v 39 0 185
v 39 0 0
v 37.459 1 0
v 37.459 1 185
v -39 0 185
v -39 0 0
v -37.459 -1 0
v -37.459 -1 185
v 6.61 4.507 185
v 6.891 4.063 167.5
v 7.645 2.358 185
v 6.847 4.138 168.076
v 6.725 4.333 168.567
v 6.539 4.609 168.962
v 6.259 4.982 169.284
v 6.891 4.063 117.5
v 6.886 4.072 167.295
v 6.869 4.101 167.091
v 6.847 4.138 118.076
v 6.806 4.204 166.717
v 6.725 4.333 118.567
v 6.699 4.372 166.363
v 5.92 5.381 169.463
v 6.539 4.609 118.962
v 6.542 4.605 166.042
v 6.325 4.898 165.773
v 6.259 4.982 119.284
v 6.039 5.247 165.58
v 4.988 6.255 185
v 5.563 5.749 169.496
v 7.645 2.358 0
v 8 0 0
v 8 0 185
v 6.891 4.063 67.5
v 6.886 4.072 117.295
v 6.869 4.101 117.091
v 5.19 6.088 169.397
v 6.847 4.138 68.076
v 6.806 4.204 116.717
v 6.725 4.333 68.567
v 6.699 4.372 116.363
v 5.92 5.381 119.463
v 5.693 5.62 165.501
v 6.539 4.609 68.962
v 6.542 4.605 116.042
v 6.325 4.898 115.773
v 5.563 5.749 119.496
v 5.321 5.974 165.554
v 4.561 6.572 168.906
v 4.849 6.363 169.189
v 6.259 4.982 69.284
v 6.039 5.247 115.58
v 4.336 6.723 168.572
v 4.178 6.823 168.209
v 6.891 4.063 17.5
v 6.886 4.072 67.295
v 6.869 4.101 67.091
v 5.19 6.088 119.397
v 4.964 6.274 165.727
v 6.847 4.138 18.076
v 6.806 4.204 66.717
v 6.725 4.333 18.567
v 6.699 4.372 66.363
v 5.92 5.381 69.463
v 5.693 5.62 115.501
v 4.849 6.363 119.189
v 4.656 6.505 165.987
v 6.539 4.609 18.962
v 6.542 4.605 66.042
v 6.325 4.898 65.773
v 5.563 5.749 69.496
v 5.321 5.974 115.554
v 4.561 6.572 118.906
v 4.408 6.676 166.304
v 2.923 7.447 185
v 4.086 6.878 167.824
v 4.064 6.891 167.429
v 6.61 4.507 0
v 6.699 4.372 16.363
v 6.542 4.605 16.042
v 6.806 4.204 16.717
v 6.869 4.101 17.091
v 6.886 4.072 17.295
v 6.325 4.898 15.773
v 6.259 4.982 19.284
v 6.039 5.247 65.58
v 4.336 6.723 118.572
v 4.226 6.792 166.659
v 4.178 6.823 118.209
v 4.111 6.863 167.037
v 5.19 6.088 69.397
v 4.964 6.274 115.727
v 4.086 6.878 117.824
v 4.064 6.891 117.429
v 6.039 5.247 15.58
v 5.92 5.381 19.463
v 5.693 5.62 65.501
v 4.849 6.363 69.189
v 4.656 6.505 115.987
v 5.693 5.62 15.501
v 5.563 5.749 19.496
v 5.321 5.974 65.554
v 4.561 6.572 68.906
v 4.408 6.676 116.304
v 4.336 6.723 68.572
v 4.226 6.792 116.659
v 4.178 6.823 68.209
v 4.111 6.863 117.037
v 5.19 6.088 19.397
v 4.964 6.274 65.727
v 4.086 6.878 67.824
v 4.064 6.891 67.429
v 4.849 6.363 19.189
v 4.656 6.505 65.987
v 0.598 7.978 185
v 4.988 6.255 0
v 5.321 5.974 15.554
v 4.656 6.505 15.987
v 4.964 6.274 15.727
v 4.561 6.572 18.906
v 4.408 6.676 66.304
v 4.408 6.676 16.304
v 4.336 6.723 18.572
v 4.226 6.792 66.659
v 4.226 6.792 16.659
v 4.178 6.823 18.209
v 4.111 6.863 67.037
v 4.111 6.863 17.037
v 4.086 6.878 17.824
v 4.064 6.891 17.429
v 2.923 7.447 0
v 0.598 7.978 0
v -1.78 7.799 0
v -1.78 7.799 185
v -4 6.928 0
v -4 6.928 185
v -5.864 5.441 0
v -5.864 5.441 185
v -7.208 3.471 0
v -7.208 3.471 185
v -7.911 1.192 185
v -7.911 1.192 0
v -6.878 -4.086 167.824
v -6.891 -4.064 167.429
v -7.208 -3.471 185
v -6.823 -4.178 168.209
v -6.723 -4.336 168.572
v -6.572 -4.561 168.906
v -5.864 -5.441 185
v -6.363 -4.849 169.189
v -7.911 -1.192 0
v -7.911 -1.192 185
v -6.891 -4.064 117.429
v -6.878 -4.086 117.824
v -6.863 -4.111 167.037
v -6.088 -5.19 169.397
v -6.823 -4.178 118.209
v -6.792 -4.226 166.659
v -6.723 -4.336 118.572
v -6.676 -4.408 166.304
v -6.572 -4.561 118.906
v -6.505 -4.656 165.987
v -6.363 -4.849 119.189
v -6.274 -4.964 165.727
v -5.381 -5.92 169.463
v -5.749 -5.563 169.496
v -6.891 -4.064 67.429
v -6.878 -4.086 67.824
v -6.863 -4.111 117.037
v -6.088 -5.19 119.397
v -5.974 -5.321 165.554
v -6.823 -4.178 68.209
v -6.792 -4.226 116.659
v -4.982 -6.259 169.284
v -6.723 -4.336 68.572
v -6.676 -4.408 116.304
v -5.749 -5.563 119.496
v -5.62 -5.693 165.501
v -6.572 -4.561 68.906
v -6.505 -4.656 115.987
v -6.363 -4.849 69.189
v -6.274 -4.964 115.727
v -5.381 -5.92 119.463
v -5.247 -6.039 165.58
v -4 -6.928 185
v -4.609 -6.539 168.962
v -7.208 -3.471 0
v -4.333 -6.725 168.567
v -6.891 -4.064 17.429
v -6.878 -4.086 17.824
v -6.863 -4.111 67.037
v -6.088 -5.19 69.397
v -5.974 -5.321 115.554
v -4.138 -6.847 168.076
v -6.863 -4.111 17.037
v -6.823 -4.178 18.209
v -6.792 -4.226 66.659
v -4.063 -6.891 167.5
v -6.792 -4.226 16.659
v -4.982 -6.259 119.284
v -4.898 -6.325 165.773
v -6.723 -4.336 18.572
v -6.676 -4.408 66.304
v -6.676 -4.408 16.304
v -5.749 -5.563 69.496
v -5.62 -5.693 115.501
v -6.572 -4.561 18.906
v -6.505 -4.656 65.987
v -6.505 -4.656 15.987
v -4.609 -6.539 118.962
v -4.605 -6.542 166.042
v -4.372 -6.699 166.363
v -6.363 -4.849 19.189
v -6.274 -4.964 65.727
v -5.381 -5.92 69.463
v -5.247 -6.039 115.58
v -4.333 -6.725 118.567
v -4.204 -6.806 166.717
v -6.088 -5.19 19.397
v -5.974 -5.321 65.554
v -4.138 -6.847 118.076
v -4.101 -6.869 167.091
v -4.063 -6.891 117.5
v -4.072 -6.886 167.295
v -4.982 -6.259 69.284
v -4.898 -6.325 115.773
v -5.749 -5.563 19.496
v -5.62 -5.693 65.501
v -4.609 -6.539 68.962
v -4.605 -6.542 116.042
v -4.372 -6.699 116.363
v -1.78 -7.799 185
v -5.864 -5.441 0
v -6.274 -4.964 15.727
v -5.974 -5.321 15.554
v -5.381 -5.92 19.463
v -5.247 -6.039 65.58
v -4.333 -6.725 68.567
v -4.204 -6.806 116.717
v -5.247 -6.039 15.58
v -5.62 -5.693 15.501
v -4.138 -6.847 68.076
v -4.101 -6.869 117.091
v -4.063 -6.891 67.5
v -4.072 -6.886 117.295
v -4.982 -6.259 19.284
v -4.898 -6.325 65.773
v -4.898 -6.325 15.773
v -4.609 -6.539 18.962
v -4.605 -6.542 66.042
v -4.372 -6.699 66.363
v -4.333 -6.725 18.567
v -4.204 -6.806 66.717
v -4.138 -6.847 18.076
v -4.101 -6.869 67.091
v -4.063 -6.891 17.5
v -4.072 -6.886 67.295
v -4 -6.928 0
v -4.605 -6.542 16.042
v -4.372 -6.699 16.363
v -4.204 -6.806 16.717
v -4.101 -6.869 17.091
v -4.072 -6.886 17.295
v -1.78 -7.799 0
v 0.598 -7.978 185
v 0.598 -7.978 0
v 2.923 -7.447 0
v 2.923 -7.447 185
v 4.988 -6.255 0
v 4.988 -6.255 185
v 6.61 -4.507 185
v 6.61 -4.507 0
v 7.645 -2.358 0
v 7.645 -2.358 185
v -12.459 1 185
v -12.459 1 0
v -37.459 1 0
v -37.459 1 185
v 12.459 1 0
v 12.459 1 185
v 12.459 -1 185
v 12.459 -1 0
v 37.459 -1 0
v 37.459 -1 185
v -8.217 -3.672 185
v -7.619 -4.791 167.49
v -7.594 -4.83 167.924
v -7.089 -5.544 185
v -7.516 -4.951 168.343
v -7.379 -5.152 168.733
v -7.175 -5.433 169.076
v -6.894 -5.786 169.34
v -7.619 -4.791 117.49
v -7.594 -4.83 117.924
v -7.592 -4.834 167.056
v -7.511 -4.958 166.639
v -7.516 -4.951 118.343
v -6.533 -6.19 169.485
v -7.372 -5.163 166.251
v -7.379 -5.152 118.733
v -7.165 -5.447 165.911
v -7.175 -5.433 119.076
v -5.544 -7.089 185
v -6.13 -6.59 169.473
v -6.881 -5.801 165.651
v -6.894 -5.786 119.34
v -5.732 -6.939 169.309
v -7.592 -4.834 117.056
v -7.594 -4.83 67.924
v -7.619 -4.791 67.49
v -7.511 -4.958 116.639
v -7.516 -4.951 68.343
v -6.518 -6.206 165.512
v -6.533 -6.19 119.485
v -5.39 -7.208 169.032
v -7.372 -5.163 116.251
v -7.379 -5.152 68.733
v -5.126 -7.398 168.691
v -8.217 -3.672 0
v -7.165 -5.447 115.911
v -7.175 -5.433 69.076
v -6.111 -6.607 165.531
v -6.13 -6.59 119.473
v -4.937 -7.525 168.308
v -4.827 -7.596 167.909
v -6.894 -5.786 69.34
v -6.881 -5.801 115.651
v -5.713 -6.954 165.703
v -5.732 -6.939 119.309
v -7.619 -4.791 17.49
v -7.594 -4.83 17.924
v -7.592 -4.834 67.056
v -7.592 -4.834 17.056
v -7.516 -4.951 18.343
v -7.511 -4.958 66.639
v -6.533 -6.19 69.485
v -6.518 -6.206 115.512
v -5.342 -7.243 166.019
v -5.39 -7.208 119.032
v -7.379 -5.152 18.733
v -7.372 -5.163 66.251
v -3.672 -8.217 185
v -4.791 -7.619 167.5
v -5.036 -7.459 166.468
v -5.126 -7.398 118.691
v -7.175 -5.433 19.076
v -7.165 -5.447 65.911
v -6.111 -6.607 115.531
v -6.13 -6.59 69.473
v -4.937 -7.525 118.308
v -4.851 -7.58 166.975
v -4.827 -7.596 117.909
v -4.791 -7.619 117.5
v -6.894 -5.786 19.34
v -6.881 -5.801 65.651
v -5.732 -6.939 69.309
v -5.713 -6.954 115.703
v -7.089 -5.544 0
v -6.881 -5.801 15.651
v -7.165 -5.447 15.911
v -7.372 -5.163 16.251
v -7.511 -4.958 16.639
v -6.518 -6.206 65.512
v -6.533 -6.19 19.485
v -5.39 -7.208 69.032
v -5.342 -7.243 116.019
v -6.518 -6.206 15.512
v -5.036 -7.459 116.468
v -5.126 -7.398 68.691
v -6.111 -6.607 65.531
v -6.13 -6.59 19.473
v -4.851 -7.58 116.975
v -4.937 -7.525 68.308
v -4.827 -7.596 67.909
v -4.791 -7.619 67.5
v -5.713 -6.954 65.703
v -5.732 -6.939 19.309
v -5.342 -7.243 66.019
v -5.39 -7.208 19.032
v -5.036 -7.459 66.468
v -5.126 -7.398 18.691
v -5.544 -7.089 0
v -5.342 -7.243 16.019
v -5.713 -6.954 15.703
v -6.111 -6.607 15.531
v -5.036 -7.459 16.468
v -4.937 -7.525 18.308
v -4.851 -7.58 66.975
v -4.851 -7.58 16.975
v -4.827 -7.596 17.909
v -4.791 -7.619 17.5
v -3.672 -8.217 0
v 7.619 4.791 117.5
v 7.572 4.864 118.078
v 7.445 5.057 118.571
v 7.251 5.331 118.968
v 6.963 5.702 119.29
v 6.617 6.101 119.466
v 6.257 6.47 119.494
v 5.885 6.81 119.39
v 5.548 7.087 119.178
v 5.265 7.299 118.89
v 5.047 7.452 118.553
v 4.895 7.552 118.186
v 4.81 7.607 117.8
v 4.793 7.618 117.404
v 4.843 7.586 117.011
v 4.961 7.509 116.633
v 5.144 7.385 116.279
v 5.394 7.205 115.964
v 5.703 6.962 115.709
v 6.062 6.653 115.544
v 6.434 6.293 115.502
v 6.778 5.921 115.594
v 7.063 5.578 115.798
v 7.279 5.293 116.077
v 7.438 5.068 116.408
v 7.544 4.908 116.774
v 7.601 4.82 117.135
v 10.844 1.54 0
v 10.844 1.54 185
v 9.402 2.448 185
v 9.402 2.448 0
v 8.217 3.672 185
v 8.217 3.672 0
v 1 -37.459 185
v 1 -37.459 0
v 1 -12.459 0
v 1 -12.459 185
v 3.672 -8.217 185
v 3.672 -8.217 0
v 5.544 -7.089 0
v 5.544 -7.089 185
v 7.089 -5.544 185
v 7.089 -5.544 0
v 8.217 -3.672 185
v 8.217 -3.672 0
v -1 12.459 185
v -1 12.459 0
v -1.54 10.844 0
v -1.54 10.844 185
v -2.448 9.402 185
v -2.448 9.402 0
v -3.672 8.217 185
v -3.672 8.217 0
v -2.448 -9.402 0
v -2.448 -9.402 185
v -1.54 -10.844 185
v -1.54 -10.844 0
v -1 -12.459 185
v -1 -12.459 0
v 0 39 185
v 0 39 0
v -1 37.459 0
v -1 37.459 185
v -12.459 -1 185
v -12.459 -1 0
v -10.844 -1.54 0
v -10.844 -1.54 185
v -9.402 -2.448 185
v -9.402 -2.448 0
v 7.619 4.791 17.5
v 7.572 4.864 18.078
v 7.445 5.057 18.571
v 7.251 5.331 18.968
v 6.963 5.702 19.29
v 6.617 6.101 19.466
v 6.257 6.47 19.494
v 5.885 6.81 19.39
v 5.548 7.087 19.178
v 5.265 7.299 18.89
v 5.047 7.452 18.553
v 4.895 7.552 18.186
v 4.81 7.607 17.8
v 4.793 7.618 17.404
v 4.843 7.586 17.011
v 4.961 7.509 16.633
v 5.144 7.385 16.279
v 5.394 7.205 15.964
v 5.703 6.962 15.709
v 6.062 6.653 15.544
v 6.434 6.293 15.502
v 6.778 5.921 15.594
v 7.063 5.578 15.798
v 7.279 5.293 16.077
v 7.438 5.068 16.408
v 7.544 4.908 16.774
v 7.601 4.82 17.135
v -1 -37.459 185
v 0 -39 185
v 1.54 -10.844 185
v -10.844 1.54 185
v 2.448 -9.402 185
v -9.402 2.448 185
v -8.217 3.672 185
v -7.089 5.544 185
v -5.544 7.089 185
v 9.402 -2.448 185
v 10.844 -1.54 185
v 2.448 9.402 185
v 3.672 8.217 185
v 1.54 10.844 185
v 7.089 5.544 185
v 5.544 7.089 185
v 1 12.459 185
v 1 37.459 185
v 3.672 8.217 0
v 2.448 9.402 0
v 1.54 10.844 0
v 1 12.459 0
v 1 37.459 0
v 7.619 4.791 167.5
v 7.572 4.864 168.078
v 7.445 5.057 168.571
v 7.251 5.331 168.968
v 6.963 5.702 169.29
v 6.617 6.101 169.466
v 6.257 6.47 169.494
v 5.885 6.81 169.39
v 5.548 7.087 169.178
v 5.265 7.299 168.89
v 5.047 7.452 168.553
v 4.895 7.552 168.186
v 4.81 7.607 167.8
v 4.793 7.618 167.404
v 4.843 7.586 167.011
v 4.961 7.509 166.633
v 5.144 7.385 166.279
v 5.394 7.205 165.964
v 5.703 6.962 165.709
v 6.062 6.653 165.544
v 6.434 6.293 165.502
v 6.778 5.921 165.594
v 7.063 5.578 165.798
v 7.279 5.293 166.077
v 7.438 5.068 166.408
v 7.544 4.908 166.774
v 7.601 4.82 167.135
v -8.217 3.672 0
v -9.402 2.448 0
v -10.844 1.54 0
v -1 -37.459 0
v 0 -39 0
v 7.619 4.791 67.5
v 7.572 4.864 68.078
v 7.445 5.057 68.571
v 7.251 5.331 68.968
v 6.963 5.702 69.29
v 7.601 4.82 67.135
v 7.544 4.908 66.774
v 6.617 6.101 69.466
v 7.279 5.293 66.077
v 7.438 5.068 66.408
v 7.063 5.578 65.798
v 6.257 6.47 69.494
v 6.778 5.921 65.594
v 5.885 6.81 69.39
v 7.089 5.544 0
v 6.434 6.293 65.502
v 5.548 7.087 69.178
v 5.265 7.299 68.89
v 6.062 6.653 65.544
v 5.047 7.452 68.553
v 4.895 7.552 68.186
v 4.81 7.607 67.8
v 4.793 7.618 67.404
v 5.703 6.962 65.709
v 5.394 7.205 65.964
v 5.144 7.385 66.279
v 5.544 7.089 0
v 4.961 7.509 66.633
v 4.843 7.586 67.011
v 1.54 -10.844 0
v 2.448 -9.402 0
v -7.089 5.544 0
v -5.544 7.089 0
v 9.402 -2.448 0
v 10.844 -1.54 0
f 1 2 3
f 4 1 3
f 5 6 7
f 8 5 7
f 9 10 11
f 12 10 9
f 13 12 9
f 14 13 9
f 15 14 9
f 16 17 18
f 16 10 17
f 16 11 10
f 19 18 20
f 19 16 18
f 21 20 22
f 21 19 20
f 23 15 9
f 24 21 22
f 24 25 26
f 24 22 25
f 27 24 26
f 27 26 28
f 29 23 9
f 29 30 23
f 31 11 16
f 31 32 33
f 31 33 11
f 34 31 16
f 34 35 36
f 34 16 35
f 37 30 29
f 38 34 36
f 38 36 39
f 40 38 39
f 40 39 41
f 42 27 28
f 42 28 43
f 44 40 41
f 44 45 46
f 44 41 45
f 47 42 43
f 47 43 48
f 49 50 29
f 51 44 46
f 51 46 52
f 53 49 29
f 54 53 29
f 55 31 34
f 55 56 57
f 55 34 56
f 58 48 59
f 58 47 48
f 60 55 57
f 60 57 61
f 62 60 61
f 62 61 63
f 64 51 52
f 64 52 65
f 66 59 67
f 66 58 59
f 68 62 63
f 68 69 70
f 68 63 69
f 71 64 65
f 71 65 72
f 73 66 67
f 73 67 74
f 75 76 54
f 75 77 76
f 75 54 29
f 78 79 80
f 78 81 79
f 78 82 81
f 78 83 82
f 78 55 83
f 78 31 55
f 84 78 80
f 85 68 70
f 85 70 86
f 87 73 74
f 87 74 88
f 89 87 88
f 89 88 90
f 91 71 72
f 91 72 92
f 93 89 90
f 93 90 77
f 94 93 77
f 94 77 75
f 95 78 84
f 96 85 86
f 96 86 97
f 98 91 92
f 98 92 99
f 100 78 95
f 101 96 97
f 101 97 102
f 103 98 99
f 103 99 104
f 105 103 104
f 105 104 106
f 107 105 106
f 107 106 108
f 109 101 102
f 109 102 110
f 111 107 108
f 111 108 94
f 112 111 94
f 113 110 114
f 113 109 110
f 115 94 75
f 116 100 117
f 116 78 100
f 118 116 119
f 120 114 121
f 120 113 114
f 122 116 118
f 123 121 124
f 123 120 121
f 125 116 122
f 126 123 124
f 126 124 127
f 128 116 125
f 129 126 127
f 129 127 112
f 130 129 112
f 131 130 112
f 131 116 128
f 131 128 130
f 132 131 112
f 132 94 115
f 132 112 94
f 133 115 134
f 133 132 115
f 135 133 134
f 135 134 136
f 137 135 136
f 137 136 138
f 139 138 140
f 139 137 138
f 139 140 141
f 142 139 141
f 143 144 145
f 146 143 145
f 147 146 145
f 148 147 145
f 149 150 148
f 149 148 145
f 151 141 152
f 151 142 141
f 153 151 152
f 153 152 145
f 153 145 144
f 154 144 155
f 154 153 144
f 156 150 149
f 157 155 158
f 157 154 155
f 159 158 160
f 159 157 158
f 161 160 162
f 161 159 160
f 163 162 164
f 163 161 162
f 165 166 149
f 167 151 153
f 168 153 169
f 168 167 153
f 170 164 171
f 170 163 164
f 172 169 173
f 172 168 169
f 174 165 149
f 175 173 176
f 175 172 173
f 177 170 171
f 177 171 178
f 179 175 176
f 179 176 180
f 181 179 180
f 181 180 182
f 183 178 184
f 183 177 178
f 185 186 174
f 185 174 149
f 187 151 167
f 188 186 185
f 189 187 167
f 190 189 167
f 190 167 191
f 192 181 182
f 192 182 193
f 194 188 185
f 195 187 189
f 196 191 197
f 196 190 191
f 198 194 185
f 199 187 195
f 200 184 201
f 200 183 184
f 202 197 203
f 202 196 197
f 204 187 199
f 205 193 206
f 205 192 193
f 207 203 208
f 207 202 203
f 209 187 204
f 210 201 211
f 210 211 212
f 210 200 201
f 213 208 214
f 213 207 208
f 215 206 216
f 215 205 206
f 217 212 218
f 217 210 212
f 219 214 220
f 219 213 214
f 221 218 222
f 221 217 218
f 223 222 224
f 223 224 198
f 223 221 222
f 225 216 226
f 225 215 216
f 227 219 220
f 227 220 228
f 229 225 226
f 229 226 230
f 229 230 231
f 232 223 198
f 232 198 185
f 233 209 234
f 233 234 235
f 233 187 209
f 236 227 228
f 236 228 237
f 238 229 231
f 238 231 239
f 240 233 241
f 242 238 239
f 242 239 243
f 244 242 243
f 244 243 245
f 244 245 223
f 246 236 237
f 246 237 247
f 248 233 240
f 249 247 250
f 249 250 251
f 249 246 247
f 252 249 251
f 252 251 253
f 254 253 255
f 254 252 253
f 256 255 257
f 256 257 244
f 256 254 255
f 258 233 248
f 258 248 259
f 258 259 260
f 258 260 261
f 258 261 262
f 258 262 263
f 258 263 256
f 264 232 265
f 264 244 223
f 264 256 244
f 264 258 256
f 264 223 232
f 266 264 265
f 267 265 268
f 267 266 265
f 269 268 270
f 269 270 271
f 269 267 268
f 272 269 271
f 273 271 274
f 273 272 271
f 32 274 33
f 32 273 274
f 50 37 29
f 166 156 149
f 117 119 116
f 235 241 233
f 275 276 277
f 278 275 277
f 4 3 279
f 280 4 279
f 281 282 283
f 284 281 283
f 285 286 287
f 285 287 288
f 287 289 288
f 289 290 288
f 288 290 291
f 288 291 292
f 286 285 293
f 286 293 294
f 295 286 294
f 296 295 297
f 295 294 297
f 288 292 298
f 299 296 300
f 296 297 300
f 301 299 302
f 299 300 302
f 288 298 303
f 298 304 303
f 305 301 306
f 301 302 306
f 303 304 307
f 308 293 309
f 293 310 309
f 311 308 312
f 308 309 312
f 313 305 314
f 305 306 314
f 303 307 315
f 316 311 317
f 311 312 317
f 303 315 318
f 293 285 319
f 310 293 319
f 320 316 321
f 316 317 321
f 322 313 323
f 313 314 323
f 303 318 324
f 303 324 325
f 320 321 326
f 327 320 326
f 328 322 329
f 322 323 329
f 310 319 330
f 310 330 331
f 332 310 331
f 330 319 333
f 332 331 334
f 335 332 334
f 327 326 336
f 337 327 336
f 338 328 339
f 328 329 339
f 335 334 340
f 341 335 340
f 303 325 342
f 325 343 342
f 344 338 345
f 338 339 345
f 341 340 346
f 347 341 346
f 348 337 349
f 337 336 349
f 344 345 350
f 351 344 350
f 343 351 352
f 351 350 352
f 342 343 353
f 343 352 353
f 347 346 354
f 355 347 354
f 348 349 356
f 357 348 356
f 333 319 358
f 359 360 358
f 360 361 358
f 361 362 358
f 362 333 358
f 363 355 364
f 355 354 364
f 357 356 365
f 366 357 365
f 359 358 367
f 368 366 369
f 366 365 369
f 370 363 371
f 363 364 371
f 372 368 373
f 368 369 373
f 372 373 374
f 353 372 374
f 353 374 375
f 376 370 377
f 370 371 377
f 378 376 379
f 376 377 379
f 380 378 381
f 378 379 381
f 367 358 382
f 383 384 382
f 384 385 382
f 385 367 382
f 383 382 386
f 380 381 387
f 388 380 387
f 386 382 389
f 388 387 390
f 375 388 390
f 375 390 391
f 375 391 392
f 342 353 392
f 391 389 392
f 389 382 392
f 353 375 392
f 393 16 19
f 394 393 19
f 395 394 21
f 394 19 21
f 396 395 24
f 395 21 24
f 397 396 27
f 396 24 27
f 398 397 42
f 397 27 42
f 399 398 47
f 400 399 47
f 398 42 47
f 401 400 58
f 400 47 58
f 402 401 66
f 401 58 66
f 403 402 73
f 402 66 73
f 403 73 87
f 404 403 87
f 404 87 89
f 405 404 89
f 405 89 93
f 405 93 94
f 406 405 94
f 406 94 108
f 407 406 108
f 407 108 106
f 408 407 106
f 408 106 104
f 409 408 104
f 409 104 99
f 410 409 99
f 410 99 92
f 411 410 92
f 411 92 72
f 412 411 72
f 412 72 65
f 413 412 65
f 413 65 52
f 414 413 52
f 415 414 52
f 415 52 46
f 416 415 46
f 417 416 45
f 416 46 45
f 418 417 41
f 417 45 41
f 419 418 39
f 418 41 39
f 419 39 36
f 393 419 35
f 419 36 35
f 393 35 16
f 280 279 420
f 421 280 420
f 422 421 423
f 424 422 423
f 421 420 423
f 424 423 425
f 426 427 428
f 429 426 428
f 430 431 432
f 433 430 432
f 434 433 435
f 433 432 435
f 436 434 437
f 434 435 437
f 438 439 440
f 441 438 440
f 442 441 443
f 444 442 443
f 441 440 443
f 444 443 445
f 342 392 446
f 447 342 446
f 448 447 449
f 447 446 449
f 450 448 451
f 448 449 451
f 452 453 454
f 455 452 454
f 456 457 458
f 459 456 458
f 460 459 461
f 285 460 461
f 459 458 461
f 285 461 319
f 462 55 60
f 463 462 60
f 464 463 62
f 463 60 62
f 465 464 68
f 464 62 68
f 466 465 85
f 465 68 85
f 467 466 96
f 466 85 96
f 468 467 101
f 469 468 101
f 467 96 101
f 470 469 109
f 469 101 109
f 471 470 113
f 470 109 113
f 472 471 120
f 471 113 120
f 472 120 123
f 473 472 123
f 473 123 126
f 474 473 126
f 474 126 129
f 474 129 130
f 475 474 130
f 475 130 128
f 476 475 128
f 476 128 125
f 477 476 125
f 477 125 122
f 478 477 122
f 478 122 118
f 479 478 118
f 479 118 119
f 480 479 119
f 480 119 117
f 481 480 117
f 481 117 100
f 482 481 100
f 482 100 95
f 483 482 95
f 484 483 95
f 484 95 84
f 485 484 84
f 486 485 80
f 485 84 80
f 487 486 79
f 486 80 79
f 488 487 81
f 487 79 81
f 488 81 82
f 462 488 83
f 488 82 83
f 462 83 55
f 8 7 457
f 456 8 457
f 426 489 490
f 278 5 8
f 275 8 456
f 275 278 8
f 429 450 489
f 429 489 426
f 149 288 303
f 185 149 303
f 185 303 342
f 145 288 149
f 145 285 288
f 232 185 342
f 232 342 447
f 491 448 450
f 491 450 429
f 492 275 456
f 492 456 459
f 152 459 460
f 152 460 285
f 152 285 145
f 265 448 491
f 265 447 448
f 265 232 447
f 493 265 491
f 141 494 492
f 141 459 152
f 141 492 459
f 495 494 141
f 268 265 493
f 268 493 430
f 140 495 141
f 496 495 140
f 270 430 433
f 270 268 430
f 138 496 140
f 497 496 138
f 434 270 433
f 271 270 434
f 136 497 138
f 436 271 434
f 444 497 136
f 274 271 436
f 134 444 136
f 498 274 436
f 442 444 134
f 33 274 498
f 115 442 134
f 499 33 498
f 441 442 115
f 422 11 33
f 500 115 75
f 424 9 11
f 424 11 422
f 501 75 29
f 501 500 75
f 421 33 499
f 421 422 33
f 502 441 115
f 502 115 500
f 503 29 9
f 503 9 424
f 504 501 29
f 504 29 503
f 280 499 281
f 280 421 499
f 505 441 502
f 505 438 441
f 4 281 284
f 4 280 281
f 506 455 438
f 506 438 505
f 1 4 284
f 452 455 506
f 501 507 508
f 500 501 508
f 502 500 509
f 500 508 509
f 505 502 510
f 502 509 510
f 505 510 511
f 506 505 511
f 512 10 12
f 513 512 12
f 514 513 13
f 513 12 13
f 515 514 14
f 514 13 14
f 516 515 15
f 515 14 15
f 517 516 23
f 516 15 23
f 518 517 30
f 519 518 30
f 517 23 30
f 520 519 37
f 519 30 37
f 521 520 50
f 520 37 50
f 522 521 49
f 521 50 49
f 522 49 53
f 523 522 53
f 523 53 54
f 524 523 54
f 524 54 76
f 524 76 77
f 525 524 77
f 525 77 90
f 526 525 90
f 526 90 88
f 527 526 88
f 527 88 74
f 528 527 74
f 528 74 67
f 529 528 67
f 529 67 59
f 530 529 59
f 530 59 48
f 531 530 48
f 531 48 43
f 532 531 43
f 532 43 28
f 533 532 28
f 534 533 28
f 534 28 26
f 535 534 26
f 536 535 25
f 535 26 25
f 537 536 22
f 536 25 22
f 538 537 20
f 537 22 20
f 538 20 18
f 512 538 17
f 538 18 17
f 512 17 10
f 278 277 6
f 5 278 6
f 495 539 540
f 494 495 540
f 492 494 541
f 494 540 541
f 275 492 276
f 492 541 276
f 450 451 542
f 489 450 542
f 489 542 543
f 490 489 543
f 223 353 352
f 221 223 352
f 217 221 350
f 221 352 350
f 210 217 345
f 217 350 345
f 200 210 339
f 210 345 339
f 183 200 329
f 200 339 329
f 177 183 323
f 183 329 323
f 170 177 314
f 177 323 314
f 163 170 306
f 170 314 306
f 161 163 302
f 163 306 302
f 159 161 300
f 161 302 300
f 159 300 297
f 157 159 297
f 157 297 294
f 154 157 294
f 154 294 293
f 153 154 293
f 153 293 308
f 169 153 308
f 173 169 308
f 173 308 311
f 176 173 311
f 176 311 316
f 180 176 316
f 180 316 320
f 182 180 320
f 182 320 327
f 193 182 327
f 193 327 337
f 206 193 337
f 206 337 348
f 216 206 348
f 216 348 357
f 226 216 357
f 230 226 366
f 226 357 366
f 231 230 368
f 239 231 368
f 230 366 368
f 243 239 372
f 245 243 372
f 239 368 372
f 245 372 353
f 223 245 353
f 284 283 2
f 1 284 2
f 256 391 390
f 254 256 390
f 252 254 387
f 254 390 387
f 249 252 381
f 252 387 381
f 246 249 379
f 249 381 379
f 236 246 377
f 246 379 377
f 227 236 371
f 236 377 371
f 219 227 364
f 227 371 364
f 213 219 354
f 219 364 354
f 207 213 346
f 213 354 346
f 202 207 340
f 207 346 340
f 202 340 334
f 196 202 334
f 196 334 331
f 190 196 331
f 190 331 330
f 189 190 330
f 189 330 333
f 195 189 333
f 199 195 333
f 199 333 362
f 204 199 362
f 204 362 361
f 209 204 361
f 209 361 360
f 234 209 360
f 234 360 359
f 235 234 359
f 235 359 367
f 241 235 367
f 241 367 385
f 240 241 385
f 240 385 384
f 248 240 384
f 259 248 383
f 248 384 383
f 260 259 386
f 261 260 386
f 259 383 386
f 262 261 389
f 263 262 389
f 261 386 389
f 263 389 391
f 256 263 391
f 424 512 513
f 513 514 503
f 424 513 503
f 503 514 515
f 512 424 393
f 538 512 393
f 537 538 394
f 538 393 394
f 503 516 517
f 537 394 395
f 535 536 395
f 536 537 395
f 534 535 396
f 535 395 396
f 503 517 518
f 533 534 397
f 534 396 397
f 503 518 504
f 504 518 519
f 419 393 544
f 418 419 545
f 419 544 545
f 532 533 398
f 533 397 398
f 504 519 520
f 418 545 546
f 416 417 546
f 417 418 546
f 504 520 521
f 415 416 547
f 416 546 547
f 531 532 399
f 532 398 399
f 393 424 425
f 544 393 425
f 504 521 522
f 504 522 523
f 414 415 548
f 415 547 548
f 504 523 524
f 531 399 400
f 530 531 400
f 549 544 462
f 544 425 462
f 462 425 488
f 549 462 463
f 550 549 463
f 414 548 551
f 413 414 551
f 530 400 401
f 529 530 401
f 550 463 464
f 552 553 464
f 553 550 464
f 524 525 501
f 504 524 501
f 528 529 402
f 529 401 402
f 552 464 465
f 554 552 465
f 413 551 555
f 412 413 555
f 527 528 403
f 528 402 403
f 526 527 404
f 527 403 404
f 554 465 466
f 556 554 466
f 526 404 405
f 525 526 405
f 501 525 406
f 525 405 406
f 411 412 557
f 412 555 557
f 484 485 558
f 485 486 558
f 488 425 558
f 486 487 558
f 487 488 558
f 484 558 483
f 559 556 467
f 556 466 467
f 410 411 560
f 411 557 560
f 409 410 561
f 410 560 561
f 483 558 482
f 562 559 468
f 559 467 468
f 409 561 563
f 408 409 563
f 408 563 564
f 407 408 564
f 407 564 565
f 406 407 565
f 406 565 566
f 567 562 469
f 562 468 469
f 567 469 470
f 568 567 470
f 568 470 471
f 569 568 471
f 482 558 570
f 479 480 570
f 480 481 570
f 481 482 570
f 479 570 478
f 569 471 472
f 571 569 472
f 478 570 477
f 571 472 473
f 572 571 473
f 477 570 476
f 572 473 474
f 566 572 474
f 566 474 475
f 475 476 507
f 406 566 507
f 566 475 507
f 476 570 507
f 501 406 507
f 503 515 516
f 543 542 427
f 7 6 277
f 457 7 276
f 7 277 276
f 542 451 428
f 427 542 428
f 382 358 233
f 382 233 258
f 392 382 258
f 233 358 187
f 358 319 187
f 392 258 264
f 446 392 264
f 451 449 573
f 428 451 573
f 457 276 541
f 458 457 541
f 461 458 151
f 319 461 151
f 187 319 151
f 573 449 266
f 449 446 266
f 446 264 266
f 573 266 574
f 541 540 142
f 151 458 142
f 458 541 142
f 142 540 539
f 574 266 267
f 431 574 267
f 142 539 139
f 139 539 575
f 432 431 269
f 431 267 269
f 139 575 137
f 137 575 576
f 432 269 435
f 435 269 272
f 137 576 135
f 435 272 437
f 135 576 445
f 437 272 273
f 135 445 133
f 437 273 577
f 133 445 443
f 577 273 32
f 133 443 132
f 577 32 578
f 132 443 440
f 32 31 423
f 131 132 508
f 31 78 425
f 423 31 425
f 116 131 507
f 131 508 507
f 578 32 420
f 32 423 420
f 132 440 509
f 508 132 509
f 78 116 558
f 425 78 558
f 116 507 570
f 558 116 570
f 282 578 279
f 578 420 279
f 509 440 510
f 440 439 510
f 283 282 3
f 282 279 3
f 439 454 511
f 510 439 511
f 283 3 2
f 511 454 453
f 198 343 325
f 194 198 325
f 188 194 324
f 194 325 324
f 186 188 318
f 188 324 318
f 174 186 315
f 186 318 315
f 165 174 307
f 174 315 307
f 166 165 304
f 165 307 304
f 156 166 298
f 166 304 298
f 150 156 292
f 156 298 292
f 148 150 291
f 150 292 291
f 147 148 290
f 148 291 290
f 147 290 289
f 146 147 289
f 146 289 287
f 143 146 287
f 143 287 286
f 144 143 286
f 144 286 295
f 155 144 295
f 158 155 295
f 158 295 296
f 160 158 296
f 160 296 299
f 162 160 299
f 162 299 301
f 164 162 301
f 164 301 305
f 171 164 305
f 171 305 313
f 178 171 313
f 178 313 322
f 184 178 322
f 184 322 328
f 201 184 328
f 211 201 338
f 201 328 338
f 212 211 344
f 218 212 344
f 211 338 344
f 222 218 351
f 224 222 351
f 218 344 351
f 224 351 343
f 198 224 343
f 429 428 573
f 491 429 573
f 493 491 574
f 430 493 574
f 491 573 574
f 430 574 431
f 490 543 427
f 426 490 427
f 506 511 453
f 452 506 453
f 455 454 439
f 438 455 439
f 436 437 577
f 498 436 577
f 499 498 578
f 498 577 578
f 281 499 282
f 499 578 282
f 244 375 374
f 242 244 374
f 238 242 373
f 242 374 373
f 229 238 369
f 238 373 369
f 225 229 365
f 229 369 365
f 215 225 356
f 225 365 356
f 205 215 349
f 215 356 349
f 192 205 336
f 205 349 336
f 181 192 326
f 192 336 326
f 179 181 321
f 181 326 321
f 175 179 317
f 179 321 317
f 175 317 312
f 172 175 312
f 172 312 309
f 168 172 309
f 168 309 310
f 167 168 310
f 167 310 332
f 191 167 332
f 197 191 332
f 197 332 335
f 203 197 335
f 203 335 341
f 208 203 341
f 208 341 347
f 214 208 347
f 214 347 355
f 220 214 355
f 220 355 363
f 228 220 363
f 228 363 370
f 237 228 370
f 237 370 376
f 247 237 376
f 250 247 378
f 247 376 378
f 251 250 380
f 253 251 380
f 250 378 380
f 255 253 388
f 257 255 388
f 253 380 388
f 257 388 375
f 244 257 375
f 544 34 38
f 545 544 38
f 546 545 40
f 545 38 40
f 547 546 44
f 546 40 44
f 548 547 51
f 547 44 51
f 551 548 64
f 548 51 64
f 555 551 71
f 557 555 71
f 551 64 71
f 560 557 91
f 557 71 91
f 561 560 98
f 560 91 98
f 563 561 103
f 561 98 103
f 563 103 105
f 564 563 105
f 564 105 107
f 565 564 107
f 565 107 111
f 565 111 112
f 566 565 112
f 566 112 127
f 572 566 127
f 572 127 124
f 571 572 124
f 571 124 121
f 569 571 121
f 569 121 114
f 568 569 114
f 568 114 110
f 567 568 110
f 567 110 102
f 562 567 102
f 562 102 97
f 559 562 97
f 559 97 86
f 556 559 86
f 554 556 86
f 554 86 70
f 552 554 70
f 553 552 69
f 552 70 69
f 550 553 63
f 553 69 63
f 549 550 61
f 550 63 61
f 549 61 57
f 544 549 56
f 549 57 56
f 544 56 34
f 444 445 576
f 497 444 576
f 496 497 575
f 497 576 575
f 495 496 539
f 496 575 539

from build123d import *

# Parameters (mm, degrees)
F0_R     = 8
F1_DEPTH = 185
F5_R     = 2
F6_DEPTH = 100


with BuildPart() as f1:
    # F0 (on Top) → F1 (new body)
    with BuildSketch(Plane.XY):
        with BuildLine():
            Line((-1, 37.4594671652), (-1, 12.4594671652))
            ThreePointArc((-1, 12.4594671652), (-1.9508662737, 10.095434036), (-3.6722679744, 8.2167175882))
            ThreePointArc((-3.6722679744, 8.2167175882), (-6.3639610307, 6.3639610307), (-8.2167175882, 3.6722679744))
            ThreePointArc((-8.2167175882, 3.6722679744), (-10.095434036, 1.9508662737), (-12.4594671652, 1))
            Line((-12.4594671652, 1), (-37.4594671652, 1))
            Line((-37.4594671652, 1), (-39, 0))
            Line((-39, 0), (-37.4594671652, -1))
            Line((-37.4594671652, -1), (-12.4594671652, -1))
            ThreePointArc((-12.4594671652, -1), (-10.095434036, -1.9508662737), (-8.2167175882, -3.6722679744))
            ThreePointArc((-8.2167175882, -3.6722679744), (-6.3639610307, -6.3639610307), (-3.6722679744, -8.2167175882))
            ThreePointArc((-3.6722679744, -8.2167175882), (-1.9508662737, -10.095434036), (-1, -12.4594671652))
            Line((-1, -12.4594671652), (-1, -37.4594671652))
            Line((-1, -37.4594671652), (0, -39))
            Line((0, -39), (1, -37.4594671652))
            Line((1, -37.4594671652), (1, -12.4594671652))
            ThreePointArc((1, -12.4594671652), (1.9508662737, -10.095434036), (3.6722679744, -8.2167175882))
            ThreePointArc((3.6722679744, -8.2167175882), (6.3639610307, -6.3639610307), (8.2167175882, -3.6722679744))
            ThreePointArc((8.2167175882, -3.6722679744), (10.095434036, -1.9508662737), (12.4594671652, -1))
            Line((12.4594671652, -1), (37.4594671652, -1))
            Line((37.4594671652, -1), (39, 0))
            Line((39, 0), (37.4594671652, 1))
            Line((37.4594671652, 1), (12.4594671652, 1))
            ThreePointArc((12.4594671652, 1), (10.095434036, 1.9508662737), (8.2167175882, 3.6722679744))
            ThreePointArc((8.2167175882, 3.6722679744), (6.3639610307, 6.3639610307), (3.6722679744, 8.2167175882))
            ThreePointArc((3.6722679744, 8.2167175882), (1.9508662737, 10.095434036), (1, 12.4594671652))
            Line((1, 12.4594671652), (1, 37.4594671652))
            Line((1, 37.4594671652), (0, 39))
            Line((0, 39), (-1, 37.4594671652))
        make_face()
        Circle(F0_R, mode=Mode.SUBTRACT)
    extrude(amount=F1_DEPTH)

    # F5 (on offset) → F6 (cut)
    with BuildSketch(Plane(origin=(-6.3639610307, -6.3639610307, 0), x_dir=(0.7071067812, -0.7071067812, 0), z_dir=(-0.7071067812, -0.7071067812, 0))):
        with Locations((0, 17.5)):
            Circle(F5_R)
        with Locations((0, 67.5)):
            Circle(F5_R)
        with Locations((0, 117.5)):
            Circle(F5_R)
        with Locations((0, 167.5)):
            Circle(F5_R)
    extrude(amount=-F6_DEPTH, mode=Mode.SUBTRACT)


solid = f1.part
